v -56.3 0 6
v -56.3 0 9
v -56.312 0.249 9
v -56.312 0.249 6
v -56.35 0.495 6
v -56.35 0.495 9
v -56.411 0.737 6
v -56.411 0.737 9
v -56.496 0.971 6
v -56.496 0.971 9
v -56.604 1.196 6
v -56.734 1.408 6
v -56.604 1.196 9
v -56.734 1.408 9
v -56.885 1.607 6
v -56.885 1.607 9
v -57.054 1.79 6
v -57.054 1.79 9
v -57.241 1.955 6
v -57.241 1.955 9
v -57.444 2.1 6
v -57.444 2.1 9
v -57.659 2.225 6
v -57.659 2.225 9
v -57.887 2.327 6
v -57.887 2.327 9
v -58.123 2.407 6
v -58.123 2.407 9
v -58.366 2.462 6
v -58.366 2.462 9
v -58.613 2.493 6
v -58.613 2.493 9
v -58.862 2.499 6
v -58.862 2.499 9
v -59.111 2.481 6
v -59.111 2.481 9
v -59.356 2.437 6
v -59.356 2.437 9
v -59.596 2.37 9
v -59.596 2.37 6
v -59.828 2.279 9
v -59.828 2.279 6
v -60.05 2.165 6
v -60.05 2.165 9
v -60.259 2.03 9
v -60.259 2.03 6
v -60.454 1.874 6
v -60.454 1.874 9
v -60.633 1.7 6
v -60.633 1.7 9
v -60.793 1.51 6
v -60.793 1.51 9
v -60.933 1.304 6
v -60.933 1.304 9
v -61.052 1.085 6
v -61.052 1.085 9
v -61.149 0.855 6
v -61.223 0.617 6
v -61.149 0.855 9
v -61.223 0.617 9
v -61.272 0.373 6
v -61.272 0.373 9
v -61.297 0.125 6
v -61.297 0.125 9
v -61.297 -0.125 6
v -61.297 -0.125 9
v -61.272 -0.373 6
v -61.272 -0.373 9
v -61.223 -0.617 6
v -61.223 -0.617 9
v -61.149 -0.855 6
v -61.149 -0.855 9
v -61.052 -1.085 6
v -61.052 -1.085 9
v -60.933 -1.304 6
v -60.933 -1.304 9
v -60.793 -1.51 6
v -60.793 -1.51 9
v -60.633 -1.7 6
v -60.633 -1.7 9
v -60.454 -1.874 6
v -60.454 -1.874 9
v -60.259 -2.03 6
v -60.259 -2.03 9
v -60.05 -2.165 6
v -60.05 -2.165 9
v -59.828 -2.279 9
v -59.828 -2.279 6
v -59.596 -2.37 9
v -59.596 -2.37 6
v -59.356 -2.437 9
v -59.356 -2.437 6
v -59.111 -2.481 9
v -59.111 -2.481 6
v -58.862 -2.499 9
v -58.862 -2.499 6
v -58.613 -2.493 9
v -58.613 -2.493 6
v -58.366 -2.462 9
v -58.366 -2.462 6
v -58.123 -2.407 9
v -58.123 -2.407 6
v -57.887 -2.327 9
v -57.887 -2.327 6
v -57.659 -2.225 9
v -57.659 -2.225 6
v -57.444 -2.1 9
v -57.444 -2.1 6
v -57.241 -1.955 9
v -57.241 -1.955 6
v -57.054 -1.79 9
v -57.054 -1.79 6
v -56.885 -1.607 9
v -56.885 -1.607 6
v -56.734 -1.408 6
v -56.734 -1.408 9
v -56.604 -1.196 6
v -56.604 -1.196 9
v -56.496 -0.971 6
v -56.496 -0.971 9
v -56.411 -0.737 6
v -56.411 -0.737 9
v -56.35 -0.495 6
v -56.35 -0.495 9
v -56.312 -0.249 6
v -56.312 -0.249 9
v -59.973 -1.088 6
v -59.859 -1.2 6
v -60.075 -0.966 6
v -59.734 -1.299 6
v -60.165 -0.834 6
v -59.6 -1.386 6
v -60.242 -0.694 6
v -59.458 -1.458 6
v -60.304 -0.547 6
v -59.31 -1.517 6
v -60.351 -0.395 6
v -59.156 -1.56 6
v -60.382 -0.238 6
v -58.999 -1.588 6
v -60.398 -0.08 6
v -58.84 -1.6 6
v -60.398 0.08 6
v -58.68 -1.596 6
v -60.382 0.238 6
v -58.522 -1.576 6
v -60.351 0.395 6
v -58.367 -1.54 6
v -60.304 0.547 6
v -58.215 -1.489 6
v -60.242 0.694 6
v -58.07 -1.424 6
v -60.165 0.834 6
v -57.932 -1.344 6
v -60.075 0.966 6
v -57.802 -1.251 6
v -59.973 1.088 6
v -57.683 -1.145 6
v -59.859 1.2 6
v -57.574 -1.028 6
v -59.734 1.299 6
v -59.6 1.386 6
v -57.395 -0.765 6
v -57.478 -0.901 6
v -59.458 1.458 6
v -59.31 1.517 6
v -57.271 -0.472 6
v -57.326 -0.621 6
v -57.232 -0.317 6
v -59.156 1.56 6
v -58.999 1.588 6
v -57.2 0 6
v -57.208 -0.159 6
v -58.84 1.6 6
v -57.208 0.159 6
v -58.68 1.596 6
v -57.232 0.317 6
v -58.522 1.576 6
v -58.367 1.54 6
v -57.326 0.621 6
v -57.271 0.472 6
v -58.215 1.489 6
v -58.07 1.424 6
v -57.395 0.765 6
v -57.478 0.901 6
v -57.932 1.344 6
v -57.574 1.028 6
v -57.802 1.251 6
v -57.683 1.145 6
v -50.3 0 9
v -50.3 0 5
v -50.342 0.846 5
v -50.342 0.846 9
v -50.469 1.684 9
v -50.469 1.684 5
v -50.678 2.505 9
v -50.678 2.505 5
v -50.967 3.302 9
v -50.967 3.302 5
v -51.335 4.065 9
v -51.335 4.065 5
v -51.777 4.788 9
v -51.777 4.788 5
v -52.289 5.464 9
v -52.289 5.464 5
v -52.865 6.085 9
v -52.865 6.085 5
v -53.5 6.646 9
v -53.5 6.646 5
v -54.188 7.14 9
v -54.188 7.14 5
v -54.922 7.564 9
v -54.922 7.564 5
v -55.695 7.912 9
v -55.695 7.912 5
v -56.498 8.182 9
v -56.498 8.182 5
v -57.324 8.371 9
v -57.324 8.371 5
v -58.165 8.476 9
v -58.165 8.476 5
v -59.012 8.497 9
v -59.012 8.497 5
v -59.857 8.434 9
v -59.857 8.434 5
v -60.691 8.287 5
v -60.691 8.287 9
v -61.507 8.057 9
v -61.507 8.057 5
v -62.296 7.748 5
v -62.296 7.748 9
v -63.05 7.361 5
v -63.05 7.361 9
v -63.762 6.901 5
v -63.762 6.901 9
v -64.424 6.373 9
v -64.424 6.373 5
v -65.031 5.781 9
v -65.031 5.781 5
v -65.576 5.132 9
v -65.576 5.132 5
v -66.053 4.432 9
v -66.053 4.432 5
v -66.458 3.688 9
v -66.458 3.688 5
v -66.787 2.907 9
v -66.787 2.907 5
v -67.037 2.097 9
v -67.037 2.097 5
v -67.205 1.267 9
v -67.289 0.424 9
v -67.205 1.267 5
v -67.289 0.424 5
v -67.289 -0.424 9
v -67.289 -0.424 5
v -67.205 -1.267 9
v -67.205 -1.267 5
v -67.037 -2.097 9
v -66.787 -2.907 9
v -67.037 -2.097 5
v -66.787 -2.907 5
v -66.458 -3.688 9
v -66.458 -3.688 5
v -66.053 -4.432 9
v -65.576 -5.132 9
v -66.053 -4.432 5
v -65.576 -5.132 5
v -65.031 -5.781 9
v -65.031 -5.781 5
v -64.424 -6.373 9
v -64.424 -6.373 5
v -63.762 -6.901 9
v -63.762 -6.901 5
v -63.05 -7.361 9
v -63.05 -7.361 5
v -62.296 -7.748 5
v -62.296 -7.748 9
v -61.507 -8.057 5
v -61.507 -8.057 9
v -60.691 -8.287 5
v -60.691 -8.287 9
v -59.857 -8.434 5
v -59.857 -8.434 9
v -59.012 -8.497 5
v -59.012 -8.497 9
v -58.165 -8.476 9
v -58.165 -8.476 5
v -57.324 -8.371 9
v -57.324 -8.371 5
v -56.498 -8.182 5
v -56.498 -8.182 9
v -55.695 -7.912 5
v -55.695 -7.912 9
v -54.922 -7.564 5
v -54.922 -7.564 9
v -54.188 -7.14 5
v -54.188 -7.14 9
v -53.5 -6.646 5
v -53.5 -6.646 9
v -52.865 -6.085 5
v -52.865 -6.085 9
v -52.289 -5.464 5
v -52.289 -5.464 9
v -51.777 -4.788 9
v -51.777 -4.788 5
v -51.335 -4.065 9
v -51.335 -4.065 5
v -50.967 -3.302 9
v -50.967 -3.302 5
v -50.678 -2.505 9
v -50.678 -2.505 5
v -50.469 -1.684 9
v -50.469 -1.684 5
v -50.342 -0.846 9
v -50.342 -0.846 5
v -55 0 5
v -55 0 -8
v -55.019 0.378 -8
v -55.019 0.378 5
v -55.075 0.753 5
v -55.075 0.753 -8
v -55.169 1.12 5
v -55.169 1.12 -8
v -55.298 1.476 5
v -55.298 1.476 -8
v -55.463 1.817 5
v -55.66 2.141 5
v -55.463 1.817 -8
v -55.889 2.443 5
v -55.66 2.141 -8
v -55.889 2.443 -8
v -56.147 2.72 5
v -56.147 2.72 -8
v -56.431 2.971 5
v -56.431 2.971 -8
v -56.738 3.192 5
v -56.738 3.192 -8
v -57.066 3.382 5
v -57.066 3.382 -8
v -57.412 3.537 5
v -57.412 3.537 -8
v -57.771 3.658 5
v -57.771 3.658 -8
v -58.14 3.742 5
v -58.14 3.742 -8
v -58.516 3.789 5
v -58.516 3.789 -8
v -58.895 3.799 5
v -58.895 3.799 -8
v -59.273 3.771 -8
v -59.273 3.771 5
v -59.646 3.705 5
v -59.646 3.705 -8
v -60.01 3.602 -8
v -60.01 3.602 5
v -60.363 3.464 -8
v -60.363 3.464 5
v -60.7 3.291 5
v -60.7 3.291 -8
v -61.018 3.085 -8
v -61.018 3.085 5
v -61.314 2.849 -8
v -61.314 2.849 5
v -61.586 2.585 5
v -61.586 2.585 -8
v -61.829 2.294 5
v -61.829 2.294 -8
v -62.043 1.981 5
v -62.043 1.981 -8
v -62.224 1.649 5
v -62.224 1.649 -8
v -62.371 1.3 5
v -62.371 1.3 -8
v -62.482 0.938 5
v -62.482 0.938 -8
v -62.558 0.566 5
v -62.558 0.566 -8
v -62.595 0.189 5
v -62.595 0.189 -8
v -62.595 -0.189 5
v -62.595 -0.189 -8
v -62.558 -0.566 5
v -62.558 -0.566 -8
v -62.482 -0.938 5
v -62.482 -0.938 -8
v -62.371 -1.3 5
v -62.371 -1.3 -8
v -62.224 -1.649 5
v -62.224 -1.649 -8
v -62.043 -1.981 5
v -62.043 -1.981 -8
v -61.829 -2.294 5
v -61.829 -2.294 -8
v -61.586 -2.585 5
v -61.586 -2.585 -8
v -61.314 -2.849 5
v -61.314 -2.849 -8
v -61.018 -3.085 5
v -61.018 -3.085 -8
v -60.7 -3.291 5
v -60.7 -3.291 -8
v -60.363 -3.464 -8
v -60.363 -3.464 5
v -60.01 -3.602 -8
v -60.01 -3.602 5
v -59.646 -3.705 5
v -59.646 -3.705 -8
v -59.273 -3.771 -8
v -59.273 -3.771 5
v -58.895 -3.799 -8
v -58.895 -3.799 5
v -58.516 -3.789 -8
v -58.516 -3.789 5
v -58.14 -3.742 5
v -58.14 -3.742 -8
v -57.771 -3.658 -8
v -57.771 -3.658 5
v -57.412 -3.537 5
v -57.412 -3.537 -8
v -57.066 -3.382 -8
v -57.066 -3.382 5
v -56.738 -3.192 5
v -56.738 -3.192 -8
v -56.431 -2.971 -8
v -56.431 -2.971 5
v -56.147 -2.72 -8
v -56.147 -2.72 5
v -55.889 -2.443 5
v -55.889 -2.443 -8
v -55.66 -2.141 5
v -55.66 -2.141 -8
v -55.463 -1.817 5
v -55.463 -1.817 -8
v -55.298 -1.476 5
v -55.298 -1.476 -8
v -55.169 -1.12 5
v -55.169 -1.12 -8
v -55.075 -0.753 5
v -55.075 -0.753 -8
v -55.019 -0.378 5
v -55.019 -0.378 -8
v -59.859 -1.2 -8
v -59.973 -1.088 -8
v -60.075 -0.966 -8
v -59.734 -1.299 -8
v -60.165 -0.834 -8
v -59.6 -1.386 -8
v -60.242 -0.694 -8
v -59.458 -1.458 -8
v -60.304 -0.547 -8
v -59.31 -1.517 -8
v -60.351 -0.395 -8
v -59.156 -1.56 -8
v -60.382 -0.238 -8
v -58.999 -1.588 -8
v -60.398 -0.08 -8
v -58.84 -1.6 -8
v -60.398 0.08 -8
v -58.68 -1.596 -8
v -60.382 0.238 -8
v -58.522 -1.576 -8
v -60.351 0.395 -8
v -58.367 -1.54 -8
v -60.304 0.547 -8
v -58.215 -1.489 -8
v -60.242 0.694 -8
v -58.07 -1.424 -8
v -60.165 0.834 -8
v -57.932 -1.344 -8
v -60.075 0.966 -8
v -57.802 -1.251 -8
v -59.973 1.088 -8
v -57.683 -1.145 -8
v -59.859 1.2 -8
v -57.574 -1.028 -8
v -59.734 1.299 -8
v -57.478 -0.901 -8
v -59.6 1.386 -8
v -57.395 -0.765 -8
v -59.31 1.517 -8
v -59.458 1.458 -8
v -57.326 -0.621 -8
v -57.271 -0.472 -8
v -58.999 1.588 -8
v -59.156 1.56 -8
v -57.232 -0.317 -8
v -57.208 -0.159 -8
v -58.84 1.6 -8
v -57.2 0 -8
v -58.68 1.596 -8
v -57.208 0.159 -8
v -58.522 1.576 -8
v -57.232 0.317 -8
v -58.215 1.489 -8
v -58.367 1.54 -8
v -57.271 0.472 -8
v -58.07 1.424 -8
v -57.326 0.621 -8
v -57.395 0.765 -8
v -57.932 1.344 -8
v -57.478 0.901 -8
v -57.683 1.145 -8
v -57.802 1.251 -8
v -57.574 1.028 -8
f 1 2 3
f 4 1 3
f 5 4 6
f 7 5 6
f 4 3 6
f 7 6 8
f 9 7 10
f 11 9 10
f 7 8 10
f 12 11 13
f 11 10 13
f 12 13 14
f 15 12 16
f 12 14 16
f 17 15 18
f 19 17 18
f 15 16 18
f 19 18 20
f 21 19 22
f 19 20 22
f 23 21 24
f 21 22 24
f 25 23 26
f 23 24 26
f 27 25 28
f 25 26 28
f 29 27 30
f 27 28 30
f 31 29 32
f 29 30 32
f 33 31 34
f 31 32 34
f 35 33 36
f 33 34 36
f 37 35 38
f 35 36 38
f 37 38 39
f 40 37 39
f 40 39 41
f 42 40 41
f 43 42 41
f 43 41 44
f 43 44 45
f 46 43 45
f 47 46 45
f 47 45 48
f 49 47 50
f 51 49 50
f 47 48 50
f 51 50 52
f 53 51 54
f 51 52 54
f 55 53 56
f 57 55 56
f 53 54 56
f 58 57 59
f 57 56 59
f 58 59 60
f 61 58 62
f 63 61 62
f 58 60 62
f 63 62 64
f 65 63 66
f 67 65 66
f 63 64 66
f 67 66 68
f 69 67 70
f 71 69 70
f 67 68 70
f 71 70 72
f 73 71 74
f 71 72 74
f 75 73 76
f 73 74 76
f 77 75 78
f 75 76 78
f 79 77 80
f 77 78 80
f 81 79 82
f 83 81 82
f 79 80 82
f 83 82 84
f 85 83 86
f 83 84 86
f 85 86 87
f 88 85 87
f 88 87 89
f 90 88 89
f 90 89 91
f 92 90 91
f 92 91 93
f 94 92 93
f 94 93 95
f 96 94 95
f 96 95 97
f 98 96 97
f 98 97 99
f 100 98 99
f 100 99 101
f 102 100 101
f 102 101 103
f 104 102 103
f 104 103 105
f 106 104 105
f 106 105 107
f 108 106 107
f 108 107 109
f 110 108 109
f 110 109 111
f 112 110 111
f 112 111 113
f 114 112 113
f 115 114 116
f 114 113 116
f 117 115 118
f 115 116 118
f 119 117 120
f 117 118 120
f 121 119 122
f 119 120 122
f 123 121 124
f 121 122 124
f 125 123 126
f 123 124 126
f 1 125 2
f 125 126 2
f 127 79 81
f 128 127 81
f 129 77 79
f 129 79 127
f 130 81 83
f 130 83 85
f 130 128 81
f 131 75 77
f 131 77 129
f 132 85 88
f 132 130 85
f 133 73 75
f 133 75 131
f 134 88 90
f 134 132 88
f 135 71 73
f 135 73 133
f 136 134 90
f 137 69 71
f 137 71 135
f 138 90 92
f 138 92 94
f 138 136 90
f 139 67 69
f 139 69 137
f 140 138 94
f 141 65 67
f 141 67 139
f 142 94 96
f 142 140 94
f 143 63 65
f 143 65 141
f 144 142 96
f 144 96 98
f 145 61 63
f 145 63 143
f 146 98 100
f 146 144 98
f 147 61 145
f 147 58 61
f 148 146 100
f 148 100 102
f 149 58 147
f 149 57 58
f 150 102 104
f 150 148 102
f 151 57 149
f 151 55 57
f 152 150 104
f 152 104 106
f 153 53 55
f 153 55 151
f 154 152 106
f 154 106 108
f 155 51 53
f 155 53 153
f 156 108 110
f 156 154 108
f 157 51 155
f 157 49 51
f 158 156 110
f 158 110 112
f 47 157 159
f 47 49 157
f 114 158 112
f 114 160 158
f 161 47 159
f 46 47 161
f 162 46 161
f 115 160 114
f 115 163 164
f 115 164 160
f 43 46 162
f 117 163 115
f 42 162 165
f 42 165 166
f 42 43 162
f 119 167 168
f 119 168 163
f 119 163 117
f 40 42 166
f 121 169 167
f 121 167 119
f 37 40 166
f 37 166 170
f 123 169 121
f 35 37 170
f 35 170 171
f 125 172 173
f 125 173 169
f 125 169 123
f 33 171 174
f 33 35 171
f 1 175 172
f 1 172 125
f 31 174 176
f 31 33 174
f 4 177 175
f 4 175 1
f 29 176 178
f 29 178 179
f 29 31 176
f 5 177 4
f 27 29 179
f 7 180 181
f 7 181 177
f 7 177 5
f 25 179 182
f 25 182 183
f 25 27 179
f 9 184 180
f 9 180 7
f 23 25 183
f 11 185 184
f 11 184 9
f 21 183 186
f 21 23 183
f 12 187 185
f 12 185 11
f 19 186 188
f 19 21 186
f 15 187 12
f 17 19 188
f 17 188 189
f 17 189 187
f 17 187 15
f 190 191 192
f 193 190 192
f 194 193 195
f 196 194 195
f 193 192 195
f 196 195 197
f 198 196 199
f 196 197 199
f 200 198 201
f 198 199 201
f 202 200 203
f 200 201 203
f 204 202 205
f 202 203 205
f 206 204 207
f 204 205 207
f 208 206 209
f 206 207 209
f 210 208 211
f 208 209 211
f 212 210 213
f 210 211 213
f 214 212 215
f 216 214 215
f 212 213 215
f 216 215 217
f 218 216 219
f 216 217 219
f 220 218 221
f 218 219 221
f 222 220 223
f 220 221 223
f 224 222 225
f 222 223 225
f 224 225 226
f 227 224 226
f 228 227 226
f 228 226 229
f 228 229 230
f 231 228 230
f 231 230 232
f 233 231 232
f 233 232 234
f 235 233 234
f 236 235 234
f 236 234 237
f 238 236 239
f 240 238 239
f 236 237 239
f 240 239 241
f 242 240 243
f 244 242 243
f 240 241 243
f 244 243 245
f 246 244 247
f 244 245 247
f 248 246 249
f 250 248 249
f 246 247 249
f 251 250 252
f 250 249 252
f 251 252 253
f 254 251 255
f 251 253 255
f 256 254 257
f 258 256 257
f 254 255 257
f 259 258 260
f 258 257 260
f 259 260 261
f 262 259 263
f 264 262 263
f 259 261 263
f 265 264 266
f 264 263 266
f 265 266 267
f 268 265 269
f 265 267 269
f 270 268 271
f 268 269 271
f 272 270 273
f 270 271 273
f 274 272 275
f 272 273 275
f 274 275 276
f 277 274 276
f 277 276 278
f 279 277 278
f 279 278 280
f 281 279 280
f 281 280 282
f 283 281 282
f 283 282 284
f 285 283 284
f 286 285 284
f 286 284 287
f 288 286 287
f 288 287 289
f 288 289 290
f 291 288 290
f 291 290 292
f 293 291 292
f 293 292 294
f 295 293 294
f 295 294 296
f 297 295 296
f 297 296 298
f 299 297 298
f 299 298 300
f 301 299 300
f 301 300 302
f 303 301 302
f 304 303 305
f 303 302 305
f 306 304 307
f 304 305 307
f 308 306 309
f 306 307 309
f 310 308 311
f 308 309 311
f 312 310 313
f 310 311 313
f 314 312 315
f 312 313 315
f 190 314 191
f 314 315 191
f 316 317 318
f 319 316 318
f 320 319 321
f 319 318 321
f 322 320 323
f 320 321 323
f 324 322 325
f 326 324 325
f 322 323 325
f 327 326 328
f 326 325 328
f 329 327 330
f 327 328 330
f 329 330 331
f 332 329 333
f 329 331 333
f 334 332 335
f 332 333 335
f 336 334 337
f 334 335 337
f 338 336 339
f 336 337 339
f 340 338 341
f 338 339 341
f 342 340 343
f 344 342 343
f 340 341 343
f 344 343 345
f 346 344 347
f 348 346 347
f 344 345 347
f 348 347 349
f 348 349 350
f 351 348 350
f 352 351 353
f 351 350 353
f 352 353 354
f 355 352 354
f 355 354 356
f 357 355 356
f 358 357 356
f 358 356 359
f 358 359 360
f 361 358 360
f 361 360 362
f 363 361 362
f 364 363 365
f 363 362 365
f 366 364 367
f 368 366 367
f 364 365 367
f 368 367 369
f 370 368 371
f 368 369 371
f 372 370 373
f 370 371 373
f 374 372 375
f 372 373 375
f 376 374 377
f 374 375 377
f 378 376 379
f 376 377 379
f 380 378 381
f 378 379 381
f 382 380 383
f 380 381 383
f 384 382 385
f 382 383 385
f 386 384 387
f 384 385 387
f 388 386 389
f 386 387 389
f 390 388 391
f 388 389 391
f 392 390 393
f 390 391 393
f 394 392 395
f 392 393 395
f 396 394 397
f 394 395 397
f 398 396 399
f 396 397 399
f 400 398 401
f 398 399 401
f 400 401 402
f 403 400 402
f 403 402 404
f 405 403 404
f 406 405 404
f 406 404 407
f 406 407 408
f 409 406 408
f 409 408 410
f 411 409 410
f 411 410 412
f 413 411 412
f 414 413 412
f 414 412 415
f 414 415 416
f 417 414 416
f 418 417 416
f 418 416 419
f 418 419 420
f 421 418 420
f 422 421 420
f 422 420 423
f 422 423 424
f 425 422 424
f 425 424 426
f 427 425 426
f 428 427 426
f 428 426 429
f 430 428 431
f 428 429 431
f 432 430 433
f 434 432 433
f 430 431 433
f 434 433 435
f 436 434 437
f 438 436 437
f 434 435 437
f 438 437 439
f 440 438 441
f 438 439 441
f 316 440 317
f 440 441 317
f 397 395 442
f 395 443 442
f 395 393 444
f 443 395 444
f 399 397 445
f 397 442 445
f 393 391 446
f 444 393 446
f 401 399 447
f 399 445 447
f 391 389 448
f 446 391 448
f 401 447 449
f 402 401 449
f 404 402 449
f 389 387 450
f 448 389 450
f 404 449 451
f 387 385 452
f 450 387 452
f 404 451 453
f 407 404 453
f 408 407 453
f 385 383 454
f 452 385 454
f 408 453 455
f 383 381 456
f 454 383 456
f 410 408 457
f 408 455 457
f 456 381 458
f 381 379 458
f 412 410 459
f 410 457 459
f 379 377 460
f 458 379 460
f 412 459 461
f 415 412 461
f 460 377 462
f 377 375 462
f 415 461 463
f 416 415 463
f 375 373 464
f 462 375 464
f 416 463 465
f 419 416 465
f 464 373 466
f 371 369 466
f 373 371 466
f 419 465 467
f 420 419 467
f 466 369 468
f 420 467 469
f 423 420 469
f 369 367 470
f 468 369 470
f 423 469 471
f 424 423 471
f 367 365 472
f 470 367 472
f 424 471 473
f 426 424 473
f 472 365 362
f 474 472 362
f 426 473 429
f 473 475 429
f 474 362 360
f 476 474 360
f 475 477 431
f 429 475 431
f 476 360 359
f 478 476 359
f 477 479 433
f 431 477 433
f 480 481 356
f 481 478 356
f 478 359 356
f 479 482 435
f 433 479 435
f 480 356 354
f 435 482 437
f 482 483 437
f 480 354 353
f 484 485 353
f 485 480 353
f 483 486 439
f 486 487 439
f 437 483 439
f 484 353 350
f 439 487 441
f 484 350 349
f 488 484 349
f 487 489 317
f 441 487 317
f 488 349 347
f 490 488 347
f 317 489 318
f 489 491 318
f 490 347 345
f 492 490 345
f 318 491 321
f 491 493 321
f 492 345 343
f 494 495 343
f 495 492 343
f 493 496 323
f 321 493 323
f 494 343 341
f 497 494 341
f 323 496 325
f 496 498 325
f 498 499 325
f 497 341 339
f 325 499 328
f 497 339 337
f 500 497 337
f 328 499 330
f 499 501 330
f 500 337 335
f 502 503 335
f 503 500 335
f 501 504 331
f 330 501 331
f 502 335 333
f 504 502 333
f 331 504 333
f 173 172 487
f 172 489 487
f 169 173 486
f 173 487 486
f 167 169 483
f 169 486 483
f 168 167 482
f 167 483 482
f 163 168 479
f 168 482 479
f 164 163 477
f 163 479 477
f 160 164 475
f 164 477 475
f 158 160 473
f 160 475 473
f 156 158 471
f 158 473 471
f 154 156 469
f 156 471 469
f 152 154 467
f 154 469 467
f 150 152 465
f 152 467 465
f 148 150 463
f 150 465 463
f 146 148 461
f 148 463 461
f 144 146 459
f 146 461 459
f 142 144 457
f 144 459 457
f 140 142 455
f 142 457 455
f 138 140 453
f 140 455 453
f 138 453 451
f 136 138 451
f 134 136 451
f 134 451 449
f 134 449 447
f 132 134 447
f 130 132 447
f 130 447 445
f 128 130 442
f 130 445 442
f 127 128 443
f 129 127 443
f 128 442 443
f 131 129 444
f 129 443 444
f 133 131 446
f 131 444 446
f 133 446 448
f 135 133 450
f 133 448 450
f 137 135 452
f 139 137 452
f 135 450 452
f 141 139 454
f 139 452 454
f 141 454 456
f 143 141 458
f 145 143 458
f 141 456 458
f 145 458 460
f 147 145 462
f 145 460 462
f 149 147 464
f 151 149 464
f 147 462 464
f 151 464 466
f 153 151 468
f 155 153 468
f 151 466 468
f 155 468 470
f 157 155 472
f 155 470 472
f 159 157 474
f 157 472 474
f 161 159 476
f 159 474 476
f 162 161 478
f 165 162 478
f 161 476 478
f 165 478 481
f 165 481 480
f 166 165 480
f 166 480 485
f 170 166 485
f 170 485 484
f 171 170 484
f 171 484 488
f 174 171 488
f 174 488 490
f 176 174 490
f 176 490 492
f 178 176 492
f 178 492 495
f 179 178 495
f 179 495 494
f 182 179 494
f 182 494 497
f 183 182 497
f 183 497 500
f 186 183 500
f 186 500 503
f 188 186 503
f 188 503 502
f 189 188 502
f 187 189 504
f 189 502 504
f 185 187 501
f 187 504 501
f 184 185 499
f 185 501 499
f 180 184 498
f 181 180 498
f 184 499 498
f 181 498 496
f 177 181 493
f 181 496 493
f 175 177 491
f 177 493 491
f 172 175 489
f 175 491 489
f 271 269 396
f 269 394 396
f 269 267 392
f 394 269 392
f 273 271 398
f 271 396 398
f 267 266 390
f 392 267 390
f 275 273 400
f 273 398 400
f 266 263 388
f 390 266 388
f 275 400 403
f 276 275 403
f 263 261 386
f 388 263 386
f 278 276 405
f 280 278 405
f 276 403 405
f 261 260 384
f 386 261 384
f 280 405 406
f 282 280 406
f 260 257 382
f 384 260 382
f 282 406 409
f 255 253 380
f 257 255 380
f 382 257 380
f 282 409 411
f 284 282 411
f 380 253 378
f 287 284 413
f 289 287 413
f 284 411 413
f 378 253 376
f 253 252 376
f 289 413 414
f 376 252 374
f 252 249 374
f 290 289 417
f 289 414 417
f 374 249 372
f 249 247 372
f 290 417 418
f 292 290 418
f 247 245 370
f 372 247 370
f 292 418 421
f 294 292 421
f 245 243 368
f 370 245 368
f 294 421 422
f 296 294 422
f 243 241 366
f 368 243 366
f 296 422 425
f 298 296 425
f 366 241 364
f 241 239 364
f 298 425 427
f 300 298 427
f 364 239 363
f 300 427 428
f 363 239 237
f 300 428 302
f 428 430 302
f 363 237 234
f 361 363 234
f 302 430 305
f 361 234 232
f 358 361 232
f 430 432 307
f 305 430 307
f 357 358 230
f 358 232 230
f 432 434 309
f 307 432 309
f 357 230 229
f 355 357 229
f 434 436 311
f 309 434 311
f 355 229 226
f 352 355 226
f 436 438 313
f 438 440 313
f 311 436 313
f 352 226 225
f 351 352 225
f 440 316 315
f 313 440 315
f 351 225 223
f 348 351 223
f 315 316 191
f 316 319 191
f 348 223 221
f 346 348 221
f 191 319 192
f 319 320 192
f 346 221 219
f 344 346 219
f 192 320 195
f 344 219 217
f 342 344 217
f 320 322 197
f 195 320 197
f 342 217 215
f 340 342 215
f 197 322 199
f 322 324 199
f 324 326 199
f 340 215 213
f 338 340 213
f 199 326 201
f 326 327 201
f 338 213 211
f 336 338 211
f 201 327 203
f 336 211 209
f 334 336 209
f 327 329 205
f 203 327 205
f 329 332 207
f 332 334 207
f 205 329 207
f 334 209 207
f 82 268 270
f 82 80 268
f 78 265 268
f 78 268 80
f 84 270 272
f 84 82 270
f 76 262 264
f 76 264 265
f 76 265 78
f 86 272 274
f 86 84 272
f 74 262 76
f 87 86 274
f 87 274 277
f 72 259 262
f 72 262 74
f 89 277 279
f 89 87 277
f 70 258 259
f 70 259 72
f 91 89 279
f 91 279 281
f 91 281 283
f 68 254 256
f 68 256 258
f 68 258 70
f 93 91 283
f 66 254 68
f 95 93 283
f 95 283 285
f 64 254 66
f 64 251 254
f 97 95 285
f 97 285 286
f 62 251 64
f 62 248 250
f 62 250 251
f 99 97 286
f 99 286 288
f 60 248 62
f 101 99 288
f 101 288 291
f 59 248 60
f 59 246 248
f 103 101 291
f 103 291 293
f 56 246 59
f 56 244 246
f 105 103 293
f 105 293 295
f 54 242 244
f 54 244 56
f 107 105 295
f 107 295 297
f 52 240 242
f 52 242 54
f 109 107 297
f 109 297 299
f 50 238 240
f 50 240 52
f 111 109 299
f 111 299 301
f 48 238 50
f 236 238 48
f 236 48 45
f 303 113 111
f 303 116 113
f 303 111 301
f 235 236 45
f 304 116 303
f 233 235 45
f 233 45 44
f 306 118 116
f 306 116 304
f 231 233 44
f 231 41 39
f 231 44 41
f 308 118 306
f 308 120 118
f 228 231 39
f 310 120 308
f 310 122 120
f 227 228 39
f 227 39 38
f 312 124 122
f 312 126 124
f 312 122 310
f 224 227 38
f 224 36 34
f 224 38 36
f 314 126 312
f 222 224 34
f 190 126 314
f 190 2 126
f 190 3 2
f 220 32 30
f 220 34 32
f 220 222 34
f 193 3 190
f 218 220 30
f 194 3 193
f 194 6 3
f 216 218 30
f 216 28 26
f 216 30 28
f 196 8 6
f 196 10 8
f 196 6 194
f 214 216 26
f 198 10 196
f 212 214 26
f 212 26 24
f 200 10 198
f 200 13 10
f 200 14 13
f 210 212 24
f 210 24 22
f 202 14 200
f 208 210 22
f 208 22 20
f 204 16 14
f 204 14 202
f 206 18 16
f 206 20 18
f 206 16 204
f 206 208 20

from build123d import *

# Parameters (mm, degrees)
BOSS_EXTRUDE1_DEPTH      = 5
BOSS_EXTRUDE1_DEPTH_BACK = 8
SKETCH1_R                = 3.8
SKETCH1_R_2              = 1.6
SKETCH2_R                = 8.5
BOSS_EXTRUDE2_DEPTH      = 4
SKETCH4_R                = 1.6
CUT_EXTRUDE1_DEPTH       = 4
SKETCH5_R                = 2.5
CUT_EXTRUDE2_DEPTH       = 3


with BuildPart() as part:
    # Sketch1 → Boss-Extrude1 (new, two sides: drawn at the far end of the back side and taken through both)
    with BuildSketch(Plane.XY.offset(-BOSS_EXTRUDE1_DEPTH_BACK)):
        with Locations((-58.8, 0)):
            Circle(SKETCH1_R)
        with Locations((-58.8, 0)):
            Circle(SKETCH1_R_2, mode=Mode.SUBTRACT)
    extrude(amount=BOSS_EXTRUDE1_DEPTH + BOSS_EXTRUDE1_DEPTH_BACK)

    # Sketch2 → Boss-Extrude2 (add)
    with BuildSketch(Plane.XY.offset(5)):
        with Locations((-58.8, 0)):
            Circle(SKETCH2_R)
    extrude(amount=BOSS_EXTRUDE2_DEPTH)

    # Sketch4 → Cut-Extrude1 (cut)
    with BuildSketch(Plane(origin=(0, 0, 5), x_dir=(-1, 0, 0), z_dir=(0, 0, -1))):
        with Locations(Location((58.8, 0, 0), (0, 0, 180))):
            Circle(SKETCH4_R)
    extrude(amount=-CUT_EXTRUDE1_DEPTH, mode=Mode.SUBTRACT)

    # Sketch5 → Cut-Extrude2 (cut)
    with BuildSketch(Plane.XY.offset(9)):
        with Locations((-58.8, 0)):
            Circle(SKETCH5_R)
    extrude(amount=-CUT_EXTRUDE2_DEPTH, mode=Mode.SUBTRACT)


solid = part.part
